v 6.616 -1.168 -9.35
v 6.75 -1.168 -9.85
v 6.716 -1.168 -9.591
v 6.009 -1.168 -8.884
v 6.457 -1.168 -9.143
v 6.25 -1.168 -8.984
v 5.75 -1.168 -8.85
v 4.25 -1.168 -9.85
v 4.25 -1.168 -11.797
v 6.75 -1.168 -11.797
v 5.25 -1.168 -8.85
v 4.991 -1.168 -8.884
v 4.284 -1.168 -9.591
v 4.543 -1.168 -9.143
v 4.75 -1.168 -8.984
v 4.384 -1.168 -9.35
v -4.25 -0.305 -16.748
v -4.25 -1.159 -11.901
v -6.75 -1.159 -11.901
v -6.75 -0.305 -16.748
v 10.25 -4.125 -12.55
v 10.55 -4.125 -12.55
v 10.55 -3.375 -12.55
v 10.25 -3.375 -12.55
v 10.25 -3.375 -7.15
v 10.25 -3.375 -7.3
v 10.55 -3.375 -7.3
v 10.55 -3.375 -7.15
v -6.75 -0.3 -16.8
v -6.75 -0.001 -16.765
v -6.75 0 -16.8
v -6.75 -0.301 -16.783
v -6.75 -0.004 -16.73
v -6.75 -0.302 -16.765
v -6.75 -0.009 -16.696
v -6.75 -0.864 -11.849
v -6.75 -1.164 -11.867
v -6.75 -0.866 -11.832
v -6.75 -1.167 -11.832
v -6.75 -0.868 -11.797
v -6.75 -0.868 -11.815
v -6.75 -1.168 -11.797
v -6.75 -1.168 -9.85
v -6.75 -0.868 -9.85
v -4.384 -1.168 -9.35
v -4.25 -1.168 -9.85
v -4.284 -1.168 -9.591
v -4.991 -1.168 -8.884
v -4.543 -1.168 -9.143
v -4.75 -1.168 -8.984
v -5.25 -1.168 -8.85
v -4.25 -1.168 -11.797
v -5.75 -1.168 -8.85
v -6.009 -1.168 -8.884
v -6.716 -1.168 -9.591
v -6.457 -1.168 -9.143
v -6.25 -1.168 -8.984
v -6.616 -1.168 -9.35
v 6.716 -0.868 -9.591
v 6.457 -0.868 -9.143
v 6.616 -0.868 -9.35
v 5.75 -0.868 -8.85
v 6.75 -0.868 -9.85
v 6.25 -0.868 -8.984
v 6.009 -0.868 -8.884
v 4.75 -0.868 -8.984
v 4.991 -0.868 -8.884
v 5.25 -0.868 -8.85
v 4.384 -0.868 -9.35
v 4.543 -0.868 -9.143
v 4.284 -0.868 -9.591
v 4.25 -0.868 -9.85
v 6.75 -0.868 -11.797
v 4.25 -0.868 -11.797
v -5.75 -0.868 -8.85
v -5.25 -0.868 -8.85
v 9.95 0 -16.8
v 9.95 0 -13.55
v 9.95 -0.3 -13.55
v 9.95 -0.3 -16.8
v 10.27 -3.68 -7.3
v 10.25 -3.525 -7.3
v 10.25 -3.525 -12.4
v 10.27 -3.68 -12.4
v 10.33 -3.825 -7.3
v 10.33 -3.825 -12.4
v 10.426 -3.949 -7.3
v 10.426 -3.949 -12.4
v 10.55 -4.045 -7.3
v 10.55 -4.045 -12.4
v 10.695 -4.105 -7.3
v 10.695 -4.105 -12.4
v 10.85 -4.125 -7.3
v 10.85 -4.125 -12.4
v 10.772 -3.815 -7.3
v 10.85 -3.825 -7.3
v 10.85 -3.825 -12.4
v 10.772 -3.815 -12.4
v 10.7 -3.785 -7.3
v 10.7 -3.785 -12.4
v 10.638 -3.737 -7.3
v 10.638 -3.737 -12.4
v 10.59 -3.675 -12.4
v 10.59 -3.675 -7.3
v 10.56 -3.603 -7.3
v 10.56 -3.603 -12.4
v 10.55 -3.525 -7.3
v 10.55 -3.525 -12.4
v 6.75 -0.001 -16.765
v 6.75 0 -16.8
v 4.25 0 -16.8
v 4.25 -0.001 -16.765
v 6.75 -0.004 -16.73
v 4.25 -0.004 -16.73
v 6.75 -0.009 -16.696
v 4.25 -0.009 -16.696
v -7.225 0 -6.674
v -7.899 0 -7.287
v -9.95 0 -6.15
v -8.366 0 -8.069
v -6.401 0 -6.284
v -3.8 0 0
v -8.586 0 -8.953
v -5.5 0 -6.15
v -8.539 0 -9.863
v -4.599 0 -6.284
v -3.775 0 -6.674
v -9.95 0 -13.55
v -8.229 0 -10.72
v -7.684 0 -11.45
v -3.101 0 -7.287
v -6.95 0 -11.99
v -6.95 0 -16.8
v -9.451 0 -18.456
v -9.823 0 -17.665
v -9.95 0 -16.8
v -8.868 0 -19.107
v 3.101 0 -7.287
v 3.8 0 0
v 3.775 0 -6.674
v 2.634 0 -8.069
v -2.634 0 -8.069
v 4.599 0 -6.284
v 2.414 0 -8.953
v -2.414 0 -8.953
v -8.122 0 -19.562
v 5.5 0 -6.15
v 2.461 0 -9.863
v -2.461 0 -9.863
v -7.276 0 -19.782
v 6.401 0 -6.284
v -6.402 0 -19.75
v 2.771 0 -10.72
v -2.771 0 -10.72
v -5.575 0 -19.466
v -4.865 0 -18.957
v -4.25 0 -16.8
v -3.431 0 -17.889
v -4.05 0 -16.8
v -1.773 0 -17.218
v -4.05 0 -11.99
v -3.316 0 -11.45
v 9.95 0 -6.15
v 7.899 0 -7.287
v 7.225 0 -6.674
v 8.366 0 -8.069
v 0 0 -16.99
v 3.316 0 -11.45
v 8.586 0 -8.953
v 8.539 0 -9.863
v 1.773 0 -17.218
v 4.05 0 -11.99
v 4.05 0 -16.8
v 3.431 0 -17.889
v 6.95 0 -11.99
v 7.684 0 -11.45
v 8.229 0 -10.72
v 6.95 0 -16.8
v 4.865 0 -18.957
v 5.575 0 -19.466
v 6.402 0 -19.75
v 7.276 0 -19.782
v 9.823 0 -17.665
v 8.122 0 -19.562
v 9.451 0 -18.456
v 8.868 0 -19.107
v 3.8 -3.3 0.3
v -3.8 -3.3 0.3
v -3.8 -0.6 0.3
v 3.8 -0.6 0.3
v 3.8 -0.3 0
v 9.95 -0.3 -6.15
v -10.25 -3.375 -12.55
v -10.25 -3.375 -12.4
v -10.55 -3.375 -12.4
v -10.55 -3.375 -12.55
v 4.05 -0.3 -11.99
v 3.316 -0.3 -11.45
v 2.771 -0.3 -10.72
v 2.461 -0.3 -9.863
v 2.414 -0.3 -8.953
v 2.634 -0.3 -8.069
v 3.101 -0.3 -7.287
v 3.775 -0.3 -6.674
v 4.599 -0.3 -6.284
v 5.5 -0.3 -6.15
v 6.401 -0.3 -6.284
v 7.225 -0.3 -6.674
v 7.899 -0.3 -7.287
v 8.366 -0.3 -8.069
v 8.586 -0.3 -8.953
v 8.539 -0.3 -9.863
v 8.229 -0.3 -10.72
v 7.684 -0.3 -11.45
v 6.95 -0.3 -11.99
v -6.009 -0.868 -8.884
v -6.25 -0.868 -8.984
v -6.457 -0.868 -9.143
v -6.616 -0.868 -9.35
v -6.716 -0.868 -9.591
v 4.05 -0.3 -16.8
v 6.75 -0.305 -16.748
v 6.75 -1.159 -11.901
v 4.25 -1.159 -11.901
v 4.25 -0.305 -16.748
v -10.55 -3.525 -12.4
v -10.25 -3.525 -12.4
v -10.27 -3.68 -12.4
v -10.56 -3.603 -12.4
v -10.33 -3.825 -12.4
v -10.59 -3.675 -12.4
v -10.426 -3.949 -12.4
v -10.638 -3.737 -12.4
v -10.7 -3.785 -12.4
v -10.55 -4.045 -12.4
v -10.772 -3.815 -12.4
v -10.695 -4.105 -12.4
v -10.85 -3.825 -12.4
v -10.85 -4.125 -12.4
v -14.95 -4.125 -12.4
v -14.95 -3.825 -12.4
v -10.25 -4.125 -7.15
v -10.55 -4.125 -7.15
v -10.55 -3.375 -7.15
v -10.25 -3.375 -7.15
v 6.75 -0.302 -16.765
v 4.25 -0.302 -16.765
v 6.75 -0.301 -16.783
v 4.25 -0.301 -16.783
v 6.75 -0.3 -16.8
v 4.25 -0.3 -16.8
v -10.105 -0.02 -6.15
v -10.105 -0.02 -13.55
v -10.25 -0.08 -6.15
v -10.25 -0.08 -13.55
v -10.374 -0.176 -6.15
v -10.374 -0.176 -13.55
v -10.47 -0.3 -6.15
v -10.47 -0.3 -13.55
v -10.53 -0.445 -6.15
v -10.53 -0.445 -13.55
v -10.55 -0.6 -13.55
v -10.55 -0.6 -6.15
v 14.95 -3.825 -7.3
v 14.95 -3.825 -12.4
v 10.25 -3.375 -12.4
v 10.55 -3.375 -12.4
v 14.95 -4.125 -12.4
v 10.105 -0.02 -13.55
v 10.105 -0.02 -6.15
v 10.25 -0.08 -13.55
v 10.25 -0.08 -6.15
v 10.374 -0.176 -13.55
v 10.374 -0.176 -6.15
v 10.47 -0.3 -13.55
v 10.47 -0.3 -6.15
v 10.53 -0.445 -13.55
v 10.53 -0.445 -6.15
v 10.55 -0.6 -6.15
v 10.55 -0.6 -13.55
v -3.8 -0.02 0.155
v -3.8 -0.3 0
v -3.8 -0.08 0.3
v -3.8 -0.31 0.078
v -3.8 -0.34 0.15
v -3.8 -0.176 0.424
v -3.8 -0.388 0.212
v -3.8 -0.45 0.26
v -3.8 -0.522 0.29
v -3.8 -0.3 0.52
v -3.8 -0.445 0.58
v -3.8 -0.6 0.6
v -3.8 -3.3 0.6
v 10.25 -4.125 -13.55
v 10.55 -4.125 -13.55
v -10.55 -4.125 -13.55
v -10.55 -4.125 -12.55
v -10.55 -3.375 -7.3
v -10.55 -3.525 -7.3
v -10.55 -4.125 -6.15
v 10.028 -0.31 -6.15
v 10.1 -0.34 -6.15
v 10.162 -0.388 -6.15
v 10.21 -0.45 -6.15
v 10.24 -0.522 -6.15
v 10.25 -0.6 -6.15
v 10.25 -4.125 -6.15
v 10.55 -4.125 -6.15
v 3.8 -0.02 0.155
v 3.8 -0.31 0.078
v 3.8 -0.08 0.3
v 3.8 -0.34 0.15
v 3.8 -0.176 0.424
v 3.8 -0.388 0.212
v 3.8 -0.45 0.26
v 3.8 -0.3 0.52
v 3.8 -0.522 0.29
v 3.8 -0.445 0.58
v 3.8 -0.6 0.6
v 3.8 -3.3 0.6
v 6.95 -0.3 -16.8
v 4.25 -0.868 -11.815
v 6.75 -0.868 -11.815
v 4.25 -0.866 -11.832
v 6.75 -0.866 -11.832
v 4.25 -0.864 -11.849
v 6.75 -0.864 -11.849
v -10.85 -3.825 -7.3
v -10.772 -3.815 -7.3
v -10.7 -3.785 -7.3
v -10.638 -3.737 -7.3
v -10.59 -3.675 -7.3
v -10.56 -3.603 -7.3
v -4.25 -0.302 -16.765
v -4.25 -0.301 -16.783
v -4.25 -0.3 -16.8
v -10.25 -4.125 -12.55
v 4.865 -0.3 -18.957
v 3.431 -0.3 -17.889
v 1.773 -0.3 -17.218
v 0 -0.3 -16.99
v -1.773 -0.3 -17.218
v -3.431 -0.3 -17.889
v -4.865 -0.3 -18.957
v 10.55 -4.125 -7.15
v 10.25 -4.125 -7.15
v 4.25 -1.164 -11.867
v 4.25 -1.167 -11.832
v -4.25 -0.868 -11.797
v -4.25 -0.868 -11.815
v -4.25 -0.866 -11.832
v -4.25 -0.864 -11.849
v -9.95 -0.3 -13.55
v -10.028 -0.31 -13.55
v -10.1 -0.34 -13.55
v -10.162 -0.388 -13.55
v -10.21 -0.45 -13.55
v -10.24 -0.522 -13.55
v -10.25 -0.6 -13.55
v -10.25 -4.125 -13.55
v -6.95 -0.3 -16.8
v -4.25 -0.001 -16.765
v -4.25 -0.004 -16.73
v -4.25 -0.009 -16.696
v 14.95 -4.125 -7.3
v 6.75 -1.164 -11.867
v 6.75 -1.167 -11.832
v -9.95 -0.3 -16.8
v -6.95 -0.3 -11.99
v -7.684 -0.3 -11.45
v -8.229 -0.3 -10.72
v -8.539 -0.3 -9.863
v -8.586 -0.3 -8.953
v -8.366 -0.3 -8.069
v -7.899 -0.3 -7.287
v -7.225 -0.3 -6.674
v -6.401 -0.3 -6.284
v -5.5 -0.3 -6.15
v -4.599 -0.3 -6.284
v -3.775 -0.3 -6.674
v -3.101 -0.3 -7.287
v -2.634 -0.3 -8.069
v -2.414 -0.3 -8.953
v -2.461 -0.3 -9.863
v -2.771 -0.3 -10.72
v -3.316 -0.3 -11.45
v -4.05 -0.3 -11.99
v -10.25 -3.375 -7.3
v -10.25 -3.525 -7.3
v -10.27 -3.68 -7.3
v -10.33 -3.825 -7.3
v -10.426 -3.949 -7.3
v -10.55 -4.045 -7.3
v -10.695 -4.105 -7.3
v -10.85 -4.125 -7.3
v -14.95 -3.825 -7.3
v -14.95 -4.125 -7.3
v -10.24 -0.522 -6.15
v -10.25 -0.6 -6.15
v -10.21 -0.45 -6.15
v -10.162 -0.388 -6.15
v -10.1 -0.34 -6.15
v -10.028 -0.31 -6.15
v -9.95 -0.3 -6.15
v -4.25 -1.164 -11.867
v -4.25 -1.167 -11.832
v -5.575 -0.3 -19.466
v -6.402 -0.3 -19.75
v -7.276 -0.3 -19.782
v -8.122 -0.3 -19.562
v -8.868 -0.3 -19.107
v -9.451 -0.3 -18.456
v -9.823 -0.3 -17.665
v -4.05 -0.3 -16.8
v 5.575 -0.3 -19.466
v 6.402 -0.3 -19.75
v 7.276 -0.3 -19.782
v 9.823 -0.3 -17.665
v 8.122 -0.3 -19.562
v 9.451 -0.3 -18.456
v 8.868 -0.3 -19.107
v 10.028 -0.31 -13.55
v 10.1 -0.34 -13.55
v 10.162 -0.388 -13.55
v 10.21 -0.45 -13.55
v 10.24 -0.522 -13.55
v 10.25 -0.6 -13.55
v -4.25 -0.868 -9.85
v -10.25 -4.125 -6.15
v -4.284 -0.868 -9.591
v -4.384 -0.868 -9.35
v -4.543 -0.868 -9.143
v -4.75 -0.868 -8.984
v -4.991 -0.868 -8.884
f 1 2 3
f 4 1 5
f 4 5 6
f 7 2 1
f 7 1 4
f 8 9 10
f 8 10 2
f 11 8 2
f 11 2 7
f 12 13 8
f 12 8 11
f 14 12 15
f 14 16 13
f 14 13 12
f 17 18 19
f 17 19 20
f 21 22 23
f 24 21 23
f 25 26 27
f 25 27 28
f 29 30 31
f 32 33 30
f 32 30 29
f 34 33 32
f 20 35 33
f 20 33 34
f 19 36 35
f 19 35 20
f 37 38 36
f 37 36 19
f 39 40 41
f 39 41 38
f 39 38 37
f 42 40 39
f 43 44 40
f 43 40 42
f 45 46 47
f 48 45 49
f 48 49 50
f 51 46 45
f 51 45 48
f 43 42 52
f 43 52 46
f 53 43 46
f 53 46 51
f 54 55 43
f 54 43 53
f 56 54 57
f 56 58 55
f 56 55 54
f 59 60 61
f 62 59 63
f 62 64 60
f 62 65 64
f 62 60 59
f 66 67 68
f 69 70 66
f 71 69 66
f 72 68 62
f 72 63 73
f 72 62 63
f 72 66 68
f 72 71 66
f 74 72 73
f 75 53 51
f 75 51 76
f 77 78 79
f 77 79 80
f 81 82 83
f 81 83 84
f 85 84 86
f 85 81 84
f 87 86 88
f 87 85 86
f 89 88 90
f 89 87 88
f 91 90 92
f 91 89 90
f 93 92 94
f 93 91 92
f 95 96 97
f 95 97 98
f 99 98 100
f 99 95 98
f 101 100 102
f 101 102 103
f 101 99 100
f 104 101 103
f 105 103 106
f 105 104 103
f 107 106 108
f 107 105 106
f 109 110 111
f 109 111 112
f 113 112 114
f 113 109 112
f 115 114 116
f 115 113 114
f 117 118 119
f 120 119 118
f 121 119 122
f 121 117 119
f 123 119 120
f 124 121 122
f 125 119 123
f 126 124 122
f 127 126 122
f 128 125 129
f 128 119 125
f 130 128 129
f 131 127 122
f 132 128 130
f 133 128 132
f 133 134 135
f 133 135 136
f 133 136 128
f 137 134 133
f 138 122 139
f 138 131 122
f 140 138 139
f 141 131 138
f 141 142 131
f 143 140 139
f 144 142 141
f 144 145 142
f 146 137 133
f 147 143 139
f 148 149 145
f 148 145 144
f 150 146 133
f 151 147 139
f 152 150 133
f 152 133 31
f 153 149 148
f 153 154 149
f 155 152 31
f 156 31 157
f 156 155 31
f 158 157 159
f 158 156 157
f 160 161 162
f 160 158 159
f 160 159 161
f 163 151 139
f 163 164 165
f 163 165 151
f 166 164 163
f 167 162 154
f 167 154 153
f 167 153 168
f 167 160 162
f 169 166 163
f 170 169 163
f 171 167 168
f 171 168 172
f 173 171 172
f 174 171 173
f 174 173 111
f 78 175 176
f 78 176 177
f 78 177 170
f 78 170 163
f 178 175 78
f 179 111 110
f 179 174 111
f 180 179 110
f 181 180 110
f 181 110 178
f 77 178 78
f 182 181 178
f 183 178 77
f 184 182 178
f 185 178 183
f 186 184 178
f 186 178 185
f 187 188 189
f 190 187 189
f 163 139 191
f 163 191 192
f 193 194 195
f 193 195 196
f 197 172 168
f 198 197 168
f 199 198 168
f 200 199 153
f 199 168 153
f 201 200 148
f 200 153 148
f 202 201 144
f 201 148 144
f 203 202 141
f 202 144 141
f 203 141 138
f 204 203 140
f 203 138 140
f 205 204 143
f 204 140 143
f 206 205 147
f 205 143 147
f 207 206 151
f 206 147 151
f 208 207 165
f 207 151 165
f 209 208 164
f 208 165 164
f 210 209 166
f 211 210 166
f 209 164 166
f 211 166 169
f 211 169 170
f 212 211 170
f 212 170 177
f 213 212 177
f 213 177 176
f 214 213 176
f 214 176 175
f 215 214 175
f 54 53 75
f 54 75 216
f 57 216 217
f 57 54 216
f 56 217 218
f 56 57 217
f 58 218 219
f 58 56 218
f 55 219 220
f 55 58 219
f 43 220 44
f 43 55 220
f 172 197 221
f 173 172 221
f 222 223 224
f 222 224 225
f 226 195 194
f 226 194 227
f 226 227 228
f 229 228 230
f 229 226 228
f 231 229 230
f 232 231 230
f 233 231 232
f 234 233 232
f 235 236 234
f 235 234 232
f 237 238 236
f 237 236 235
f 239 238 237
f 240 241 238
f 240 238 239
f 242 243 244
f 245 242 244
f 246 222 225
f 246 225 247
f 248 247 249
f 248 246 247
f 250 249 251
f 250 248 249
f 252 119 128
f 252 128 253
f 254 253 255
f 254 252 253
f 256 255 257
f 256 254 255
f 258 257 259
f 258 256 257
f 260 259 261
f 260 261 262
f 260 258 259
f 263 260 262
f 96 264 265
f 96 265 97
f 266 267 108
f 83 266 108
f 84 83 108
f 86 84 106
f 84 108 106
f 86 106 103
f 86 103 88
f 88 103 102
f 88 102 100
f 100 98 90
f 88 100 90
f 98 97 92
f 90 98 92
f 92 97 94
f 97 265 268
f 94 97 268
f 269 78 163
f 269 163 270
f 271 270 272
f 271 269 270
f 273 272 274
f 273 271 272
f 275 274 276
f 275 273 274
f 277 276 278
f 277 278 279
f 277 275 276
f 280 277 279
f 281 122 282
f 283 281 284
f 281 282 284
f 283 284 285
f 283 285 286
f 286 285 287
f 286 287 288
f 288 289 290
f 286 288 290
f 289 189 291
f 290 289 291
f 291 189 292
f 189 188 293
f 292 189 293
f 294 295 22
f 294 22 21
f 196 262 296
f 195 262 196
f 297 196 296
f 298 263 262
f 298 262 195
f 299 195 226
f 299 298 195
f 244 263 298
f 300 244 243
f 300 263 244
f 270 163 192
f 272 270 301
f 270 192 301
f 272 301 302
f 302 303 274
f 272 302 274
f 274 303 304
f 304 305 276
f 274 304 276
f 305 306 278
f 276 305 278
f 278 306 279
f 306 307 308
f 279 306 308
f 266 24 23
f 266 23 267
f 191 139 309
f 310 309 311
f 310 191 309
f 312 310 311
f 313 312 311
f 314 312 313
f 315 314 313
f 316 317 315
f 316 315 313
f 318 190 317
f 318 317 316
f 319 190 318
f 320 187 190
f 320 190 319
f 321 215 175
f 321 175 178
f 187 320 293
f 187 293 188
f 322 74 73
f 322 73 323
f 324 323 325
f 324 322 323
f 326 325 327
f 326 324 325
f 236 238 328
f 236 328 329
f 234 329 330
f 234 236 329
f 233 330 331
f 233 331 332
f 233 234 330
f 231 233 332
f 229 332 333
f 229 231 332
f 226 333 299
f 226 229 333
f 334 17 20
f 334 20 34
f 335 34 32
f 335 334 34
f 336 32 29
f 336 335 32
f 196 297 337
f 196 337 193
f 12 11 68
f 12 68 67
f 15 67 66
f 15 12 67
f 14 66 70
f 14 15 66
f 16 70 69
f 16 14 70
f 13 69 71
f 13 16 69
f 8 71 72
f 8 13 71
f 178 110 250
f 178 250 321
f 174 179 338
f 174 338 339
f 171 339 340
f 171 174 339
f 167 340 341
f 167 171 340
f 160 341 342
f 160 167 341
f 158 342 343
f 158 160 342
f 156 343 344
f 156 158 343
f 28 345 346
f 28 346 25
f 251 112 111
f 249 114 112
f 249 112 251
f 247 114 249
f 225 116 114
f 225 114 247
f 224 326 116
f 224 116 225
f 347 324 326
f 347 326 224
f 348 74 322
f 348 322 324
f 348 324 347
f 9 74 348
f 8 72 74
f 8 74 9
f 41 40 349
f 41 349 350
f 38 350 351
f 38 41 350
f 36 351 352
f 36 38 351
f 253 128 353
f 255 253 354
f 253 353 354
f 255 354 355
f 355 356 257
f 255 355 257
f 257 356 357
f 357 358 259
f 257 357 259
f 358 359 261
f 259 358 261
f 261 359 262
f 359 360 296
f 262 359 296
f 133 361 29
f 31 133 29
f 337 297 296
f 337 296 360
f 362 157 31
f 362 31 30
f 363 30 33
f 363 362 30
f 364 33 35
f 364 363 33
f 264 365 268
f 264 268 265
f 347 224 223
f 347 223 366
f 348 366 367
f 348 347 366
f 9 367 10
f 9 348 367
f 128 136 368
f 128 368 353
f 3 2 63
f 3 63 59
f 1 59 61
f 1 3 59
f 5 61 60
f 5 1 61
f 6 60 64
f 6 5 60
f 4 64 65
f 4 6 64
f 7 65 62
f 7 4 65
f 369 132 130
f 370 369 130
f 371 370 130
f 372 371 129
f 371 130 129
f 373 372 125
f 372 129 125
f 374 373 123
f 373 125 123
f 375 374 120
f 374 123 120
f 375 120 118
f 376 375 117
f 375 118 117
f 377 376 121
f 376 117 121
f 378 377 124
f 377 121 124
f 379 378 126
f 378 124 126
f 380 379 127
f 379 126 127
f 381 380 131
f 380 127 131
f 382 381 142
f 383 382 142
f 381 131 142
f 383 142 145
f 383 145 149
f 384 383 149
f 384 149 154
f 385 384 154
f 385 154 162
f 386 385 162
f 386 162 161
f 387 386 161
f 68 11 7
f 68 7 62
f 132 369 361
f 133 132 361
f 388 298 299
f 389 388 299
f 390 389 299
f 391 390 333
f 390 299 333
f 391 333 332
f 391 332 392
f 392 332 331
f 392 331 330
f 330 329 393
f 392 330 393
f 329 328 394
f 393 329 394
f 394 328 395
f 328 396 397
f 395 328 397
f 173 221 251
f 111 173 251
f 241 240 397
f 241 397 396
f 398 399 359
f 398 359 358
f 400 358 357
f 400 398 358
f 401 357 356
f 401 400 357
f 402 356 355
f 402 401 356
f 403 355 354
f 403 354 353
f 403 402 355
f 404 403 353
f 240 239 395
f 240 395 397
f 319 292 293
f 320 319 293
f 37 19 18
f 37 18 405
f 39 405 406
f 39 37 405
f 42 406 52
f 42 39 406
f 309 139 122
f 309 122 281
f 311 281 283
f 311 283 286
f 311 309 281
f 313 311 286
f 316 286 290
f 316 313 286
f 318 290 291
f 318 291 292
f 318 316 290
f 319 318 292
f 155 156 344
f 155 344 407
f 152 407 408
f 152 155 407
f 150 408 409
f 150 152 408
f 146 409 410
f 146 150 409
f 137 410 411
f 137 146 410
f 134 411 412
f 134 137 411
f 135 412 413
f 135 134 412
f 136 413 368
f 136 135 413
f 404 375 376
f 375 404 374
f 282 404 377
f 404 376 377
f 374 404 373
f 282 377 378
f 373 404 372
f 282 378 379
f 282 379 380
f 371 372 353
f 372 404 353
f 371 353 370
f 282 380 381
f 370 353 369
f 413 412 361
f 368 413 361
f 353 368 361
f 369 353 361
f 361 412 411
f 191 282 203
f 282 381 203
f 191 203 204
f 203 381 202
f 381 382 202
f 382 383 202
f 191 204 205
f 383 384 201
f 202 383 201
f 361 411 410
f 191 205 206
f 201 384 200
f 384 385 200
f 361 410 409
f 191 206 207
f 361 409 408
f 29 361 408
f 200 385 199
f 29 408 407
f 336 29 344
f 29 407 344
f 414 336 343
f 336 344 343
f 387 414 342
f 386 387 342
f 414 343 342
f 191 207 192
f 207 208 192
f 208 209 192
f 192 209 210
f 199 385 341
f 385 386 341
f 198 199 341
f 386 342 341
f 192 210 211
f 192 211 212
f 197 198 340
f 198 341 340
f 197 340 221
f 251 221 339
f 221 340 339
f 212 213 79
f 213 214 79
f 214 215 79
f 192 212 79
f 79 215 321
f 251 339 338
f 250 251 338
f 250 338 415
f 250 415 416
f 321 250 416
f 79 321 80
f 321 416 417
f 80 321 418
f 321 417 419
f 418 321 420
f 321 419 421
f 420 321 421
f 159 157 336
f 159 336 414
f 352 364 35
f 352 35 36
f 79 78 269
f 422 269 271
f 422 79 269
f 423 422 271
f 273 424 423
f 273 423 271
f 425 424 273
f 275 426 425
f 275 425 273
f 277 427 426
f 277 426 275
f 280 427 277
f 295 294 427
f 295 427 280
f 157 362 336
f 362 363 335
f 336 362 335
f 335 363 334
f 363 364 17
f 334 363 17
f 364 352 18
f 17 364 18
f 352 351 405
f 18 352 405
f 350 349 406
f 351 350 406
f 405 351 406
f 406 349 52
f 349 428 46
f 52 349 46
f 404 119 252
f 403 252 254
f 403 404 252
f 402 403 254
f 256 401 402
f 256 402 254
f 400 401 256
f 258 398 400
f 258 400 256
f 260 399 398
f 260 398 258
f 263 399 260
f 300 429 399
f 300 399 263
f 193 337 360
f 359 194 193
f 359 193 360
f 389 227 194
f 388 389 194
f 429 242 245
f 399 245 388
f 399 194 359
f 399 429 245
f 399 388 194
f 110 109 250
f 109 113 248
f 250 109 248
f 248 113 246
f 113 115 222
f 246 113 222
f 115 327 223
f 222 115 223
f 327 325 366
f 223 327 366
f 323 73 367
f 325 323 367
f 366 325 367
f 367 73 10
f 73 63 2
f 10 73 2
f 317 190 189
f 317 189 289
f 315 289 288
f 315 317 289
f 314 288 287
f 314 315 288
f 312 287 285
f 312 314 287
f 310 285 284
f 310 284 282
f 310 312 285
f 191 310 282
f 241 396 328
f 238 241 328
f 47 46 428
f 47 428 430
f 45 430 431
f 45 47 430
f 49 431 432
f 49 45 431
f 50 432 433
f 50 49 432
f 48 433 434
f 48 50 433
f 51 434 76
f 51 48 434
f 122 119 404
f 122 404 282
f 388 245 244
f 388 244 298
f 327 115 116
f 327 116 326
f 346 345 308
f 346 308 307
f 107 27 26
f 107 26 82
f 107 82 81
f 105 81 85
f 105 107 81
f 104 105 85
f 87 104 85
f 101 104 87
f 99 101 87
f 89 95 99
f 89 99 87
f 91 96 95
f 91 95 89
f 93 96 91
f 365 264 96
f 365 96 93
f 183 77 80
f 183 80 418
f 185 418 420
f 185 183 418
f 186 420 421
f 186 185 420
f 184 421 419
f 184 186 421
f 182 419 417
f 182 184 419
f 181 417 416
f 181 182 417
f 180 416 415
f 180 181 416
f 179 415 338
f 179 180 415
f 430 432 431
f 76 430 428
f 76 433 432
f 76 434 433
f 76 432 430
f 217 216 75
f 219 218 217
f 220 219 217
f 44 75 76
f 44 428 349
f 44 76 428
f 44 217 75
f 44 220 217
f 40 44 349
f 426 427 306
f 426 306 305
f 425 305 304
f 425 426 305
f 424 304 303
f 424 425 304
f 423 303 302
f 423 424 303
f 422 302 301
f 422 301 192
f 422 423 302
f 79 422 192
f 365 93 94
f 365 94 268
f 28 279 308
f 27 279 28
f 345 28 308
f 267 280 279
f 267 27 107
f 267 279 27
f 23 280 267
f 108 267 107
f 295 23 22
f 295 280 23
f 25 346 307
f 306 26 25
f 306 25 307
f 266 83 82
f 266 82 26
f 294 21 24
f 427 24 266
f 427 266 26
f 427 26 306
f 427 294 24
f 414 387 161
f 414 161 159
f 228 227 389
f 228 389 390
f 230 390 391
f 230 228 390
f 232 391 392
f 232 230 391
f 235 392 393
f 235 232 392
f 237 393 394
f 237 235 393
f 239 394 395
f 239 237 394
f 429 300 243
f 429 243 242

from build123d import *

# Parameters (mm, degrees)
BASE_FLANGE1_DEPTH              = 0.3
EDGE_FLANGE2_DEPTH              = 7.6
EDGE_FLANGE3_DEPTH              = 7.4
EDGE_FLANGE3_BEND_DEPTH         = 7.4
EDGE_FLANGE9_STRIP_W            = 1.8
EDGE_FLANGE9_STRIP_H            = 0.3
EDGE_FLANGE9_STRIP_CUT_DEPTH    = 5.1
EDGE_FLANGE9_RELIEF_W           = 1.95
EDGE_FLANGE9_RELIEF_H           = 0.15
EDGE_FLANGE9_RELIEF_CUT_DEPTH   = 0.3
EDGE_FLANGE9_STRIP_2_W          = 1.8
EDGE_FLANGE9_STRIP_2_H          = 0.3
EDGE_FLANGE9_STRIP_CUT_2_DEPTH  = 5.1
EDGE_FLANGE9_RELIEF_2_W         = 1.95
EDGE_FLANGE9_RELIEF_2_H         = 0.15
EDGE_FLANGE9_RELIEF_CUT_2_DEPTH = 0.3
EDGE_FLANGE9_DEPTH              = 5.1
EDGE_FLANGE9_BEND_DEPTH         = 5.1
SKETCH164_R                     = 3.1
CUT_EXTRUDE1_DEPTH              = 10
CUT_EXTRUDE2_DEPTH              = 26.150701614
CUT_EXTRUDE2_DEPTH_BACK         = 26.150701614
SKETCH228_W                     = 2.9
SKETCH228_H                     = 7.24828594
EDGE_FLANGE10_DEPTH             = 2.5
EDGE_FLANGE10_BEND_DEPTH        = 2.5
EDGE_FLANGE11_STRIP_CUT_DEPTH   = 2.5
EDGE_FLANGE11_STRIP_CUT_2_DEPTH = 2.5
EDGE_FLANGE11_DEPTH             = 2.5
EDGE_FLANGE11_BEND_DEPTH        = 2.5
BREAK_CORNER1_START             = -1.168240888
BREAK_CORNER1_DEPTH             = 0.3


# Read off the part's stored shape, not the designer's step: Break-Corner1
# Sheet-metal steps are written as plain solids
with BuildPart() as part:
    # Sketch1 → Base-Flange1 (new body)
    with BuildSketch(Plane(origin=(0, 0, 0), x_dir=(1, 0, 0), z_dir=(0, 1, 0))):
        with BuildLine():
            Line((-3.8, 0), (3.8, 0))
            Line((3.8, 0), (9.95, 6.15))
            Line((9.95, 6.15), (9.95, 16.8))
            ThreePointArc((9.95, 16.8), (8.121537451, 19.561792896), (4.865, 18.957029207))
            ThreePointArc((4.865, 18.957029207), (0, 16.990097357), (-4.865, 18.957029207))
            ThreePointArc((-4.865, 18.957029207), (-8.121537451, 19.561792896), (-9.95, 16.8))
            Line((-9.95, 16.8), (-9.95, 6.15))
            Line((-9.95, 6.15), (-3.8, 0))
        make_face()
    extrude(amount=-BASE_FLANGE1_DEPTH)

    # Edge-Flange2 section (across the edge) → Edge-Flange2 (add)
    with BuildSketch(Plane(origin=(3.8, -0.3, 0.3), x_dir=(0, 0, -1), z_dir=(-1, 0, 0))):
        with BuildLine():
            Line((-0.3, 0.3), (-0.3, 3))
            Line((-0.3, 3), (0, 3))
            Line((0, 3), (0, 0.3))
            ThreePointArc((0, 0.3), (0.087867966, 0.087867966), (0.3, 0))
            Line((0.3, 0), (0.3, -0.3))
            ThreePointArc((0.3, -0.3), (-0.124264069, -0.124264069), (-0.3, 0.3))
        make_face()
    extrude(amount=EDGE_FLANGE2_DEPTH)

    # Edge-Flange3 section (across the edge) → Edge-Flange3 (add)
    with BuildSketch(Plane(origin=(10.25, -0.3, -13.55), x_dir=(-1, 0, 0), z_dir=(0, 0, 1))):
        with BuildLine():
            Line((-0.3, 0.3), (-0.3, 3.8249596))
            Line((-0.3, 3.8249596), (0, 3.8249596))
            Line((0, 3.8249596), (0, 0.3))
            ThreePointArc((0, 0.3), (0.087867966, 0.087867966), (0.3, 0))
            Line((0.3, 0), (0.3, -0.3))
            ThreePointArc((0.3, -0.3), (-0.124264069, -0.124264069), (-0.3, 0.3))
        make_face()
    extrude(amount=EDGE_FLANGE3_DEPTH)

    # Edge-Flange3 section 2 (across the edge) → Edge-Flange3 bend (add)
    with BuildSketch(Plane(origin=(-10.25, -0.3, -6.15), x_dir=(1, 0, 0), z_dir=(0, 0, -1))):
        with BuildLine():
            Line((-0.3, 0.3), (-0.3, 3.8249596))
            Line((-0.3, 3.8249596), (0, 3.8249596))
            Line((0, 3.8249596), (0, 0.3))
            ThreePointArc((0, 0.3), (0.087867966, 0.087867966), (0.3, 0))
            Line((0.3, 0), (0.3, -0.3))
            ThreePointArc((0.3, -0.3), (-0.124264069, -0.124264069), (-0.3, 0.3))
        make_face()
    extrude(amount=EDGE_FLANGE3_BEND_DEPTH)

    # Edge-Flange9 strip (across the edge) → Edge-Flange9 strip cut (cut)
    with BuildSketch(Plane(origin=(-10.55, -4.1249596, -12.4), x_dir=(0, 1, 0), z_dir=(0, 0, 1))):
        with Locations((-0.3, -0.15)):
            Rectangle(EDGE_FLANGE9_STRIP_W, EDGE_FLANGE9_STRIP_H)
    extrude(amount=EDGE_FLANGE9_STRIP_CUT_DEPTH, mode=Mode.SUBTRACT)

    # Edge-Flange9 relief (on the sheet) → Edge-Flange9 relief cut (cut)
    with BuildSketch(Plane(origin=(-10.55, -3.5249596, -12.4), x_dir=(0, 1, 0), z_dir=(-1, 0, 0))):
        with Locations((-0.825, 0.075)):
            Rectangle(EDGE_FLANGE9_RELIEF_W, EDGE_FLANGE9_RELIEF_H)
        with Locations((-0.825, -5.175)):
            Rectangle(EDGE_FLANGE9_RELIEF_W, EDGE_FLANGE9_RELIEF_H)
    extrude(amount=-EDGE_FLANGE9_RELIEF_CUT_DEPTH, mode=Mode.SUBTRACT)

    # Edge-Flange9 strip 2 (across the edge) → Edge-Flange9 strip cut 2 (cut)
    with BuildSketch(Plane(origin=(10.55, -4.1249596, -7.3), x_dir=(0, 1, 0), z_dir=(0, 0, -1))):
        with Locations((-0.3, -0.15)):
            Rectangle(EDGE_FLANGE9_STRIP_2_W, EDGE_FLANGE9_STRIP_2_H)
    extrude(amount=EDGE_FLANGE9_STRIP_CUT_2_DEPTH, mode=Mode.SUBTRACT)

    # Edge-Flange9 relief 2 (on the sheet) → Edge-Flange9 relief cut 2 (cut)
    with BuildSketch(Plane(origin=(10.55, -3.5249596, -7.3), x_dir=(0, 1, 0), z_dir=(1, 0, 0))):
        with Locations((-0.825, 0.075)):
            Rectangle(EDGE_FLANGE9_RELIEF_2_W, EDGE_FLANGE9_RELIEF_2_H)
        with Locations((-0.825, -5.175)):
            Rectangle(EDGE_FLANGE9_RELIEF_2_W, EDGE_FLANGE9_RELIEF_2_H)
    extrude(amount=-EDGE_FLANGE9_RELIEF_CUT_2_DEPTH, mode=Mode.SUBTRACT)

    # Edge-Flange9 section (across the edge) → Edge-Flange9 (add)
    with BuildSketch(Plane(origin=(-10.55, -4.1249596, -12.4), x_dir=(0, 1, 0), z_dir=(0, 0, 1))):
        with BuildLine():
            Line((0, 0.3), (0, 4.4))
            Line((0, 4.4), (0.3, 4.4))
            Line((0.3, 4.4), (0.3, 0.3))
            ThreePointArc((0.3, 0.3), (0.387867966, 0.087867966), (0.6, 0))
            Line((0.6, 0), (0.6, -0.3))
            ThreePointArc((0.6, -0.3), (0.175735931, -0.124264069), (0, 0.3))
        make_face()
    extrude(amount=EDGE_FLANGE9_DEPTH)

    # Edge-Flange9 section 2 (across the edge) → Edge-Flange9 bend (add)
    with BuildSketch(Plane(origin=(10.55, -4.1249596, -7.3), x_dir=(0, 1, 0), z_dir=(0, 0, -1))):
        with BuildLine():
            Line((0, 0.3), (0, 4.4))
            Line((0, 4.4), (0.3, 4.4))
            Line((0.3, 4.4), (0.3, 0.3))
            ThreePointArc((0.3, 0.3), (0.387867966, 0.087867966), (0.6, 0))
            Line((0.6, 0), (0.6, -0.3))
            ThreePointArc((0.6, -0.3), (0.175735931, -0.124264069), (0, 0.3))
        make_face()
    extrude(amount=EDGE_FLANGE9_BEND_DEPTH)

    # Sketch164 → Cut-Extrude1 (cut)
    with BuildSketch(Plane(origin=(0, 0, 0), x_dir=(1, 0, 0), z_dir=(0, 1, 0))):
        with Locations(Location((-5.5, 9.25, 0), (0, 0, 270))):
            Circle(SKETCH164_R)
        with Locations(Location((5.5, 9.25, 0), (0, 0, 270))):
            Circle(SKETCH164_R)
    extrude(amount=-CUT_EXTRUDE1_DEPTH, mode=Mode.SUBTRACT)

    # Sketch228 → Cut-Extrude2 (cut, two sides: drawn at the far end of the back side and taken through both)
    with BuildSketch(Plane(origin=(0, 0, 0), x_dir=(1, 0, 0), z_dir=(0, 1, 0)).offset(-CUT_EXTRUDE2_DEPTH_BACK)):
        with Locations((-5.5, 13.17585703)):
            Rectangle(SKETCH228_W, SKETCH228_H)
        with Locations((5.5, 13.17585703)):
            Rectangle(SKETCH228_W, SKETCH228_H)
    extrude(amount=CUT_EXTRUDE2_DEPTH + CUT_EXTRUDE2_DEPTH_BACK, mode=Mode.SUBTRACT)

    # Edge-Flange10 section (across the edge) → Edge-Flange10 (add)
    with BuildSketch(Plane(origin=(-4.25, -0.3, -16.773753401), x_dir=(0, -0.9848077530122092, -0.1736481776669237), z_dir=(-1, 0, 0))):
        with BuildLine():
            Line((-0.3, 0.026246599), (-0.3, 4.973753401))
            Line((-0.3, 4.973753401), (0, 4.973753401))
            Line((0, 4.973753401), (0, 0.026246599))
            ThreePointArc((0, 0.026246599), (0.001141591, 9.9876e-05), (0.004557674, -0.025847854))
            Line((0.004557674, -0.025847854), (-0.290884652, -0.077942308))
            ThreePointArc((-0.290884652, -0.077942308), (-0.297716819, -0.026046847), (-0.3, 0.026246599))
        make_face()
    extrude(amount=EDGE_FLANGE10_DEPTH)

    # Edge-Flange10 section 2 (across the edge) → Edge-Flange10 bend (add)
    with BuildSketch(Plane(origin=(6.75, -0.3, -16.773753401), x_dir=(0, -0.9848077530122092, -0.1736481776669237), z_dir=(-1, 0, 0))):
        with BuildLine():
            Line((-0.3, 0.026246599), (-0.3, 4.973753401))
            Line((-0.3, 4.973753401), (0, 4.973753401))
            Line((0, 4.973753401), (0, 0.026246599))
            ThreePointArc((0, 0.026246599), (0.001141591, 9.9876e-05), (0.004557674, -0.025847854))
            Line((0.004557674, -0.025847854), (-0.290884652, -0.077942308))
            ThreePointArc((-0.290884652, -0.077942308), (-0.297716819, -0.026046847), (-0.3, 0.026246599))
        make_face()
    extrude(amount=EDGE_FLANGE10_BEND_DEPTH)

    # Edge-Flange11 strip (across the edge) → Edge-Flange11 strip cut (cut)
    with BuildSketch(Plane(origin=(-6.75, -0.868240888, -11.823468037), x_dir=(0, 1, 0), z_dir=(1, 0, 0))):
        Polygon((-0.603451372, 1.694711648), (-0.290884652, -0.077942308), (0.004557674, -0.025847854), (-0.308009046, 1.746806101), align=None)
    extrude(amount=EDGE_FLANGE11_STRIP_CUT_DEPTH, mode=Mode.SUBTRACT)

    # Edge-Flange11 strip 2 (across the edge) → Edge-Flange11 strip cut 2 (cut)
    with BuildSketch(Plane(origin=(4.25, -0.868240888, -11.823468037), x_dir=(0, 1, 0), z_dir=(1, 0, 0))):
        Polygon((-0.603451372, 1.694711648), (-0.290884652, -0.077942308), (0.004557674, -0.025847854), (-0.308009046, 1.746806101), align=None)
    extrude(amount=EDGE_FLANGE11_STRIP_CUT_2_DEPTH, mode=Mode.SUBTRACT)

    # Edge-Flange11 section (across the edge) → Edge-Flange11 (add)
    with BuildSketch(Plane(origin=(-6.75, -0.868240888, -11.823468037), x_dir=(0, 1, 0), z_dir=(1, 0, 0))):
        with BuildLine():
            Line((-0.3, 0.026246599), (-0.3, 2.973753401))
            Line((-0.3, 2.973753401), (0, 2.973753401))
            Line((0, 2.973753401), (0, 0.026246599))
            ThreePointArc((0, 0.026246599), (0.001141591, 9.9876e-05), (0.004557674, -0.025847854))
            Line((0.004557674, -0.025847854), (-0.290884652, -0.077942308))
            ThreePointArc((-0.290884652, -0.077942308), (-0.297716819, -0.026046847), (-0.3, 0.026246599))
        make_face()
    extrude(amount=EDGE_FLANGE11_DEPTH)

    # Edge-Flange11 section 2 (across the edge) → Edge-Flange11 bend (add)
    with BuildSketch(Plane(origin=(4.25, -0.868240888, -11.823468037), x_dir=(0, 1, 0), z_dir=(1, 0, 0))):
        with BuildLine():
            Line((-0.3, 0.026246599), (-0.3, 2.973753401))
            Line((-0.3, 2.973753401), (0, 2.973753401))
            Line((0, 2.973753401), (0, 0.026246599))
            ThreePointArc((0, 0.026246599), (0.001141591, 9.9876e-05), (0.004557674, -0.025847854))
            Line((0.004557674, -0.025847854), (-0.290884652, -0.077942308))
            ThreePointArc((-0.290884652, -0.077942308), (-0.297716819, -0.026046847), (-0.3, 0.026246599))
        make_face()
    extrude(amount=EDGE_FLANGE11_BEND_DEPTH)

    # Break-Corner1 outline → Break-Corner1 (cut)
    with BuildSketch(Plane(origin=(0, 0, 0), x_dir=(1, 0, 0), z_dir=(0, 1, 0)).offset(BREAK_CORNER1_START)):
        with BuildLine():
            ThreePointArc((6.75, 9.849714636), (6.457106781, 9.142607855), (5.75, 8.849714636))
            Line((5.75, 8.849714636), (6.75, 8.849714636))
            Line((6.75, 8.849714636), (6.75, 9.849714636))
        make_face()
        with BuildLine():
            Line((4.25, 8.849714636), (5.25, 8.849714636))
            ThreePointArc((5.25, 8.849714636), (4.542893219, 9.142607855), (4.25, 9.849714636))
            Line((4.25, 9.849714636), (4.25, 8.849714636))
        make_face()
        with BuildLine():
            ThreePointArc((-4.25, 9.849714636), (-4.542893219, 9.142607855), (-5.25, 8.849714636))
            Line((-5.25, 8.849714636), (-4.25, 8.849714636))
            Line((-4.25, 8.849714636), (-4.25, 9.849714636))
        make_face()
        with BuildLine():
            ThreePointArc((-5.75, 8.849714636), (-6.457106781, 9.142607855), (-6.75, 9.849714636))
            Line((-6.75, 9.849714636), (-6.75, 8.849714636))
            Line((-6.75, 8.849714636), (-5.75, 8.849714636))
        make_face()
    extrude(amount=BREAK_CORNER1_DEPTH, mode=Mode.SUBTRACT)


solid = part.part
